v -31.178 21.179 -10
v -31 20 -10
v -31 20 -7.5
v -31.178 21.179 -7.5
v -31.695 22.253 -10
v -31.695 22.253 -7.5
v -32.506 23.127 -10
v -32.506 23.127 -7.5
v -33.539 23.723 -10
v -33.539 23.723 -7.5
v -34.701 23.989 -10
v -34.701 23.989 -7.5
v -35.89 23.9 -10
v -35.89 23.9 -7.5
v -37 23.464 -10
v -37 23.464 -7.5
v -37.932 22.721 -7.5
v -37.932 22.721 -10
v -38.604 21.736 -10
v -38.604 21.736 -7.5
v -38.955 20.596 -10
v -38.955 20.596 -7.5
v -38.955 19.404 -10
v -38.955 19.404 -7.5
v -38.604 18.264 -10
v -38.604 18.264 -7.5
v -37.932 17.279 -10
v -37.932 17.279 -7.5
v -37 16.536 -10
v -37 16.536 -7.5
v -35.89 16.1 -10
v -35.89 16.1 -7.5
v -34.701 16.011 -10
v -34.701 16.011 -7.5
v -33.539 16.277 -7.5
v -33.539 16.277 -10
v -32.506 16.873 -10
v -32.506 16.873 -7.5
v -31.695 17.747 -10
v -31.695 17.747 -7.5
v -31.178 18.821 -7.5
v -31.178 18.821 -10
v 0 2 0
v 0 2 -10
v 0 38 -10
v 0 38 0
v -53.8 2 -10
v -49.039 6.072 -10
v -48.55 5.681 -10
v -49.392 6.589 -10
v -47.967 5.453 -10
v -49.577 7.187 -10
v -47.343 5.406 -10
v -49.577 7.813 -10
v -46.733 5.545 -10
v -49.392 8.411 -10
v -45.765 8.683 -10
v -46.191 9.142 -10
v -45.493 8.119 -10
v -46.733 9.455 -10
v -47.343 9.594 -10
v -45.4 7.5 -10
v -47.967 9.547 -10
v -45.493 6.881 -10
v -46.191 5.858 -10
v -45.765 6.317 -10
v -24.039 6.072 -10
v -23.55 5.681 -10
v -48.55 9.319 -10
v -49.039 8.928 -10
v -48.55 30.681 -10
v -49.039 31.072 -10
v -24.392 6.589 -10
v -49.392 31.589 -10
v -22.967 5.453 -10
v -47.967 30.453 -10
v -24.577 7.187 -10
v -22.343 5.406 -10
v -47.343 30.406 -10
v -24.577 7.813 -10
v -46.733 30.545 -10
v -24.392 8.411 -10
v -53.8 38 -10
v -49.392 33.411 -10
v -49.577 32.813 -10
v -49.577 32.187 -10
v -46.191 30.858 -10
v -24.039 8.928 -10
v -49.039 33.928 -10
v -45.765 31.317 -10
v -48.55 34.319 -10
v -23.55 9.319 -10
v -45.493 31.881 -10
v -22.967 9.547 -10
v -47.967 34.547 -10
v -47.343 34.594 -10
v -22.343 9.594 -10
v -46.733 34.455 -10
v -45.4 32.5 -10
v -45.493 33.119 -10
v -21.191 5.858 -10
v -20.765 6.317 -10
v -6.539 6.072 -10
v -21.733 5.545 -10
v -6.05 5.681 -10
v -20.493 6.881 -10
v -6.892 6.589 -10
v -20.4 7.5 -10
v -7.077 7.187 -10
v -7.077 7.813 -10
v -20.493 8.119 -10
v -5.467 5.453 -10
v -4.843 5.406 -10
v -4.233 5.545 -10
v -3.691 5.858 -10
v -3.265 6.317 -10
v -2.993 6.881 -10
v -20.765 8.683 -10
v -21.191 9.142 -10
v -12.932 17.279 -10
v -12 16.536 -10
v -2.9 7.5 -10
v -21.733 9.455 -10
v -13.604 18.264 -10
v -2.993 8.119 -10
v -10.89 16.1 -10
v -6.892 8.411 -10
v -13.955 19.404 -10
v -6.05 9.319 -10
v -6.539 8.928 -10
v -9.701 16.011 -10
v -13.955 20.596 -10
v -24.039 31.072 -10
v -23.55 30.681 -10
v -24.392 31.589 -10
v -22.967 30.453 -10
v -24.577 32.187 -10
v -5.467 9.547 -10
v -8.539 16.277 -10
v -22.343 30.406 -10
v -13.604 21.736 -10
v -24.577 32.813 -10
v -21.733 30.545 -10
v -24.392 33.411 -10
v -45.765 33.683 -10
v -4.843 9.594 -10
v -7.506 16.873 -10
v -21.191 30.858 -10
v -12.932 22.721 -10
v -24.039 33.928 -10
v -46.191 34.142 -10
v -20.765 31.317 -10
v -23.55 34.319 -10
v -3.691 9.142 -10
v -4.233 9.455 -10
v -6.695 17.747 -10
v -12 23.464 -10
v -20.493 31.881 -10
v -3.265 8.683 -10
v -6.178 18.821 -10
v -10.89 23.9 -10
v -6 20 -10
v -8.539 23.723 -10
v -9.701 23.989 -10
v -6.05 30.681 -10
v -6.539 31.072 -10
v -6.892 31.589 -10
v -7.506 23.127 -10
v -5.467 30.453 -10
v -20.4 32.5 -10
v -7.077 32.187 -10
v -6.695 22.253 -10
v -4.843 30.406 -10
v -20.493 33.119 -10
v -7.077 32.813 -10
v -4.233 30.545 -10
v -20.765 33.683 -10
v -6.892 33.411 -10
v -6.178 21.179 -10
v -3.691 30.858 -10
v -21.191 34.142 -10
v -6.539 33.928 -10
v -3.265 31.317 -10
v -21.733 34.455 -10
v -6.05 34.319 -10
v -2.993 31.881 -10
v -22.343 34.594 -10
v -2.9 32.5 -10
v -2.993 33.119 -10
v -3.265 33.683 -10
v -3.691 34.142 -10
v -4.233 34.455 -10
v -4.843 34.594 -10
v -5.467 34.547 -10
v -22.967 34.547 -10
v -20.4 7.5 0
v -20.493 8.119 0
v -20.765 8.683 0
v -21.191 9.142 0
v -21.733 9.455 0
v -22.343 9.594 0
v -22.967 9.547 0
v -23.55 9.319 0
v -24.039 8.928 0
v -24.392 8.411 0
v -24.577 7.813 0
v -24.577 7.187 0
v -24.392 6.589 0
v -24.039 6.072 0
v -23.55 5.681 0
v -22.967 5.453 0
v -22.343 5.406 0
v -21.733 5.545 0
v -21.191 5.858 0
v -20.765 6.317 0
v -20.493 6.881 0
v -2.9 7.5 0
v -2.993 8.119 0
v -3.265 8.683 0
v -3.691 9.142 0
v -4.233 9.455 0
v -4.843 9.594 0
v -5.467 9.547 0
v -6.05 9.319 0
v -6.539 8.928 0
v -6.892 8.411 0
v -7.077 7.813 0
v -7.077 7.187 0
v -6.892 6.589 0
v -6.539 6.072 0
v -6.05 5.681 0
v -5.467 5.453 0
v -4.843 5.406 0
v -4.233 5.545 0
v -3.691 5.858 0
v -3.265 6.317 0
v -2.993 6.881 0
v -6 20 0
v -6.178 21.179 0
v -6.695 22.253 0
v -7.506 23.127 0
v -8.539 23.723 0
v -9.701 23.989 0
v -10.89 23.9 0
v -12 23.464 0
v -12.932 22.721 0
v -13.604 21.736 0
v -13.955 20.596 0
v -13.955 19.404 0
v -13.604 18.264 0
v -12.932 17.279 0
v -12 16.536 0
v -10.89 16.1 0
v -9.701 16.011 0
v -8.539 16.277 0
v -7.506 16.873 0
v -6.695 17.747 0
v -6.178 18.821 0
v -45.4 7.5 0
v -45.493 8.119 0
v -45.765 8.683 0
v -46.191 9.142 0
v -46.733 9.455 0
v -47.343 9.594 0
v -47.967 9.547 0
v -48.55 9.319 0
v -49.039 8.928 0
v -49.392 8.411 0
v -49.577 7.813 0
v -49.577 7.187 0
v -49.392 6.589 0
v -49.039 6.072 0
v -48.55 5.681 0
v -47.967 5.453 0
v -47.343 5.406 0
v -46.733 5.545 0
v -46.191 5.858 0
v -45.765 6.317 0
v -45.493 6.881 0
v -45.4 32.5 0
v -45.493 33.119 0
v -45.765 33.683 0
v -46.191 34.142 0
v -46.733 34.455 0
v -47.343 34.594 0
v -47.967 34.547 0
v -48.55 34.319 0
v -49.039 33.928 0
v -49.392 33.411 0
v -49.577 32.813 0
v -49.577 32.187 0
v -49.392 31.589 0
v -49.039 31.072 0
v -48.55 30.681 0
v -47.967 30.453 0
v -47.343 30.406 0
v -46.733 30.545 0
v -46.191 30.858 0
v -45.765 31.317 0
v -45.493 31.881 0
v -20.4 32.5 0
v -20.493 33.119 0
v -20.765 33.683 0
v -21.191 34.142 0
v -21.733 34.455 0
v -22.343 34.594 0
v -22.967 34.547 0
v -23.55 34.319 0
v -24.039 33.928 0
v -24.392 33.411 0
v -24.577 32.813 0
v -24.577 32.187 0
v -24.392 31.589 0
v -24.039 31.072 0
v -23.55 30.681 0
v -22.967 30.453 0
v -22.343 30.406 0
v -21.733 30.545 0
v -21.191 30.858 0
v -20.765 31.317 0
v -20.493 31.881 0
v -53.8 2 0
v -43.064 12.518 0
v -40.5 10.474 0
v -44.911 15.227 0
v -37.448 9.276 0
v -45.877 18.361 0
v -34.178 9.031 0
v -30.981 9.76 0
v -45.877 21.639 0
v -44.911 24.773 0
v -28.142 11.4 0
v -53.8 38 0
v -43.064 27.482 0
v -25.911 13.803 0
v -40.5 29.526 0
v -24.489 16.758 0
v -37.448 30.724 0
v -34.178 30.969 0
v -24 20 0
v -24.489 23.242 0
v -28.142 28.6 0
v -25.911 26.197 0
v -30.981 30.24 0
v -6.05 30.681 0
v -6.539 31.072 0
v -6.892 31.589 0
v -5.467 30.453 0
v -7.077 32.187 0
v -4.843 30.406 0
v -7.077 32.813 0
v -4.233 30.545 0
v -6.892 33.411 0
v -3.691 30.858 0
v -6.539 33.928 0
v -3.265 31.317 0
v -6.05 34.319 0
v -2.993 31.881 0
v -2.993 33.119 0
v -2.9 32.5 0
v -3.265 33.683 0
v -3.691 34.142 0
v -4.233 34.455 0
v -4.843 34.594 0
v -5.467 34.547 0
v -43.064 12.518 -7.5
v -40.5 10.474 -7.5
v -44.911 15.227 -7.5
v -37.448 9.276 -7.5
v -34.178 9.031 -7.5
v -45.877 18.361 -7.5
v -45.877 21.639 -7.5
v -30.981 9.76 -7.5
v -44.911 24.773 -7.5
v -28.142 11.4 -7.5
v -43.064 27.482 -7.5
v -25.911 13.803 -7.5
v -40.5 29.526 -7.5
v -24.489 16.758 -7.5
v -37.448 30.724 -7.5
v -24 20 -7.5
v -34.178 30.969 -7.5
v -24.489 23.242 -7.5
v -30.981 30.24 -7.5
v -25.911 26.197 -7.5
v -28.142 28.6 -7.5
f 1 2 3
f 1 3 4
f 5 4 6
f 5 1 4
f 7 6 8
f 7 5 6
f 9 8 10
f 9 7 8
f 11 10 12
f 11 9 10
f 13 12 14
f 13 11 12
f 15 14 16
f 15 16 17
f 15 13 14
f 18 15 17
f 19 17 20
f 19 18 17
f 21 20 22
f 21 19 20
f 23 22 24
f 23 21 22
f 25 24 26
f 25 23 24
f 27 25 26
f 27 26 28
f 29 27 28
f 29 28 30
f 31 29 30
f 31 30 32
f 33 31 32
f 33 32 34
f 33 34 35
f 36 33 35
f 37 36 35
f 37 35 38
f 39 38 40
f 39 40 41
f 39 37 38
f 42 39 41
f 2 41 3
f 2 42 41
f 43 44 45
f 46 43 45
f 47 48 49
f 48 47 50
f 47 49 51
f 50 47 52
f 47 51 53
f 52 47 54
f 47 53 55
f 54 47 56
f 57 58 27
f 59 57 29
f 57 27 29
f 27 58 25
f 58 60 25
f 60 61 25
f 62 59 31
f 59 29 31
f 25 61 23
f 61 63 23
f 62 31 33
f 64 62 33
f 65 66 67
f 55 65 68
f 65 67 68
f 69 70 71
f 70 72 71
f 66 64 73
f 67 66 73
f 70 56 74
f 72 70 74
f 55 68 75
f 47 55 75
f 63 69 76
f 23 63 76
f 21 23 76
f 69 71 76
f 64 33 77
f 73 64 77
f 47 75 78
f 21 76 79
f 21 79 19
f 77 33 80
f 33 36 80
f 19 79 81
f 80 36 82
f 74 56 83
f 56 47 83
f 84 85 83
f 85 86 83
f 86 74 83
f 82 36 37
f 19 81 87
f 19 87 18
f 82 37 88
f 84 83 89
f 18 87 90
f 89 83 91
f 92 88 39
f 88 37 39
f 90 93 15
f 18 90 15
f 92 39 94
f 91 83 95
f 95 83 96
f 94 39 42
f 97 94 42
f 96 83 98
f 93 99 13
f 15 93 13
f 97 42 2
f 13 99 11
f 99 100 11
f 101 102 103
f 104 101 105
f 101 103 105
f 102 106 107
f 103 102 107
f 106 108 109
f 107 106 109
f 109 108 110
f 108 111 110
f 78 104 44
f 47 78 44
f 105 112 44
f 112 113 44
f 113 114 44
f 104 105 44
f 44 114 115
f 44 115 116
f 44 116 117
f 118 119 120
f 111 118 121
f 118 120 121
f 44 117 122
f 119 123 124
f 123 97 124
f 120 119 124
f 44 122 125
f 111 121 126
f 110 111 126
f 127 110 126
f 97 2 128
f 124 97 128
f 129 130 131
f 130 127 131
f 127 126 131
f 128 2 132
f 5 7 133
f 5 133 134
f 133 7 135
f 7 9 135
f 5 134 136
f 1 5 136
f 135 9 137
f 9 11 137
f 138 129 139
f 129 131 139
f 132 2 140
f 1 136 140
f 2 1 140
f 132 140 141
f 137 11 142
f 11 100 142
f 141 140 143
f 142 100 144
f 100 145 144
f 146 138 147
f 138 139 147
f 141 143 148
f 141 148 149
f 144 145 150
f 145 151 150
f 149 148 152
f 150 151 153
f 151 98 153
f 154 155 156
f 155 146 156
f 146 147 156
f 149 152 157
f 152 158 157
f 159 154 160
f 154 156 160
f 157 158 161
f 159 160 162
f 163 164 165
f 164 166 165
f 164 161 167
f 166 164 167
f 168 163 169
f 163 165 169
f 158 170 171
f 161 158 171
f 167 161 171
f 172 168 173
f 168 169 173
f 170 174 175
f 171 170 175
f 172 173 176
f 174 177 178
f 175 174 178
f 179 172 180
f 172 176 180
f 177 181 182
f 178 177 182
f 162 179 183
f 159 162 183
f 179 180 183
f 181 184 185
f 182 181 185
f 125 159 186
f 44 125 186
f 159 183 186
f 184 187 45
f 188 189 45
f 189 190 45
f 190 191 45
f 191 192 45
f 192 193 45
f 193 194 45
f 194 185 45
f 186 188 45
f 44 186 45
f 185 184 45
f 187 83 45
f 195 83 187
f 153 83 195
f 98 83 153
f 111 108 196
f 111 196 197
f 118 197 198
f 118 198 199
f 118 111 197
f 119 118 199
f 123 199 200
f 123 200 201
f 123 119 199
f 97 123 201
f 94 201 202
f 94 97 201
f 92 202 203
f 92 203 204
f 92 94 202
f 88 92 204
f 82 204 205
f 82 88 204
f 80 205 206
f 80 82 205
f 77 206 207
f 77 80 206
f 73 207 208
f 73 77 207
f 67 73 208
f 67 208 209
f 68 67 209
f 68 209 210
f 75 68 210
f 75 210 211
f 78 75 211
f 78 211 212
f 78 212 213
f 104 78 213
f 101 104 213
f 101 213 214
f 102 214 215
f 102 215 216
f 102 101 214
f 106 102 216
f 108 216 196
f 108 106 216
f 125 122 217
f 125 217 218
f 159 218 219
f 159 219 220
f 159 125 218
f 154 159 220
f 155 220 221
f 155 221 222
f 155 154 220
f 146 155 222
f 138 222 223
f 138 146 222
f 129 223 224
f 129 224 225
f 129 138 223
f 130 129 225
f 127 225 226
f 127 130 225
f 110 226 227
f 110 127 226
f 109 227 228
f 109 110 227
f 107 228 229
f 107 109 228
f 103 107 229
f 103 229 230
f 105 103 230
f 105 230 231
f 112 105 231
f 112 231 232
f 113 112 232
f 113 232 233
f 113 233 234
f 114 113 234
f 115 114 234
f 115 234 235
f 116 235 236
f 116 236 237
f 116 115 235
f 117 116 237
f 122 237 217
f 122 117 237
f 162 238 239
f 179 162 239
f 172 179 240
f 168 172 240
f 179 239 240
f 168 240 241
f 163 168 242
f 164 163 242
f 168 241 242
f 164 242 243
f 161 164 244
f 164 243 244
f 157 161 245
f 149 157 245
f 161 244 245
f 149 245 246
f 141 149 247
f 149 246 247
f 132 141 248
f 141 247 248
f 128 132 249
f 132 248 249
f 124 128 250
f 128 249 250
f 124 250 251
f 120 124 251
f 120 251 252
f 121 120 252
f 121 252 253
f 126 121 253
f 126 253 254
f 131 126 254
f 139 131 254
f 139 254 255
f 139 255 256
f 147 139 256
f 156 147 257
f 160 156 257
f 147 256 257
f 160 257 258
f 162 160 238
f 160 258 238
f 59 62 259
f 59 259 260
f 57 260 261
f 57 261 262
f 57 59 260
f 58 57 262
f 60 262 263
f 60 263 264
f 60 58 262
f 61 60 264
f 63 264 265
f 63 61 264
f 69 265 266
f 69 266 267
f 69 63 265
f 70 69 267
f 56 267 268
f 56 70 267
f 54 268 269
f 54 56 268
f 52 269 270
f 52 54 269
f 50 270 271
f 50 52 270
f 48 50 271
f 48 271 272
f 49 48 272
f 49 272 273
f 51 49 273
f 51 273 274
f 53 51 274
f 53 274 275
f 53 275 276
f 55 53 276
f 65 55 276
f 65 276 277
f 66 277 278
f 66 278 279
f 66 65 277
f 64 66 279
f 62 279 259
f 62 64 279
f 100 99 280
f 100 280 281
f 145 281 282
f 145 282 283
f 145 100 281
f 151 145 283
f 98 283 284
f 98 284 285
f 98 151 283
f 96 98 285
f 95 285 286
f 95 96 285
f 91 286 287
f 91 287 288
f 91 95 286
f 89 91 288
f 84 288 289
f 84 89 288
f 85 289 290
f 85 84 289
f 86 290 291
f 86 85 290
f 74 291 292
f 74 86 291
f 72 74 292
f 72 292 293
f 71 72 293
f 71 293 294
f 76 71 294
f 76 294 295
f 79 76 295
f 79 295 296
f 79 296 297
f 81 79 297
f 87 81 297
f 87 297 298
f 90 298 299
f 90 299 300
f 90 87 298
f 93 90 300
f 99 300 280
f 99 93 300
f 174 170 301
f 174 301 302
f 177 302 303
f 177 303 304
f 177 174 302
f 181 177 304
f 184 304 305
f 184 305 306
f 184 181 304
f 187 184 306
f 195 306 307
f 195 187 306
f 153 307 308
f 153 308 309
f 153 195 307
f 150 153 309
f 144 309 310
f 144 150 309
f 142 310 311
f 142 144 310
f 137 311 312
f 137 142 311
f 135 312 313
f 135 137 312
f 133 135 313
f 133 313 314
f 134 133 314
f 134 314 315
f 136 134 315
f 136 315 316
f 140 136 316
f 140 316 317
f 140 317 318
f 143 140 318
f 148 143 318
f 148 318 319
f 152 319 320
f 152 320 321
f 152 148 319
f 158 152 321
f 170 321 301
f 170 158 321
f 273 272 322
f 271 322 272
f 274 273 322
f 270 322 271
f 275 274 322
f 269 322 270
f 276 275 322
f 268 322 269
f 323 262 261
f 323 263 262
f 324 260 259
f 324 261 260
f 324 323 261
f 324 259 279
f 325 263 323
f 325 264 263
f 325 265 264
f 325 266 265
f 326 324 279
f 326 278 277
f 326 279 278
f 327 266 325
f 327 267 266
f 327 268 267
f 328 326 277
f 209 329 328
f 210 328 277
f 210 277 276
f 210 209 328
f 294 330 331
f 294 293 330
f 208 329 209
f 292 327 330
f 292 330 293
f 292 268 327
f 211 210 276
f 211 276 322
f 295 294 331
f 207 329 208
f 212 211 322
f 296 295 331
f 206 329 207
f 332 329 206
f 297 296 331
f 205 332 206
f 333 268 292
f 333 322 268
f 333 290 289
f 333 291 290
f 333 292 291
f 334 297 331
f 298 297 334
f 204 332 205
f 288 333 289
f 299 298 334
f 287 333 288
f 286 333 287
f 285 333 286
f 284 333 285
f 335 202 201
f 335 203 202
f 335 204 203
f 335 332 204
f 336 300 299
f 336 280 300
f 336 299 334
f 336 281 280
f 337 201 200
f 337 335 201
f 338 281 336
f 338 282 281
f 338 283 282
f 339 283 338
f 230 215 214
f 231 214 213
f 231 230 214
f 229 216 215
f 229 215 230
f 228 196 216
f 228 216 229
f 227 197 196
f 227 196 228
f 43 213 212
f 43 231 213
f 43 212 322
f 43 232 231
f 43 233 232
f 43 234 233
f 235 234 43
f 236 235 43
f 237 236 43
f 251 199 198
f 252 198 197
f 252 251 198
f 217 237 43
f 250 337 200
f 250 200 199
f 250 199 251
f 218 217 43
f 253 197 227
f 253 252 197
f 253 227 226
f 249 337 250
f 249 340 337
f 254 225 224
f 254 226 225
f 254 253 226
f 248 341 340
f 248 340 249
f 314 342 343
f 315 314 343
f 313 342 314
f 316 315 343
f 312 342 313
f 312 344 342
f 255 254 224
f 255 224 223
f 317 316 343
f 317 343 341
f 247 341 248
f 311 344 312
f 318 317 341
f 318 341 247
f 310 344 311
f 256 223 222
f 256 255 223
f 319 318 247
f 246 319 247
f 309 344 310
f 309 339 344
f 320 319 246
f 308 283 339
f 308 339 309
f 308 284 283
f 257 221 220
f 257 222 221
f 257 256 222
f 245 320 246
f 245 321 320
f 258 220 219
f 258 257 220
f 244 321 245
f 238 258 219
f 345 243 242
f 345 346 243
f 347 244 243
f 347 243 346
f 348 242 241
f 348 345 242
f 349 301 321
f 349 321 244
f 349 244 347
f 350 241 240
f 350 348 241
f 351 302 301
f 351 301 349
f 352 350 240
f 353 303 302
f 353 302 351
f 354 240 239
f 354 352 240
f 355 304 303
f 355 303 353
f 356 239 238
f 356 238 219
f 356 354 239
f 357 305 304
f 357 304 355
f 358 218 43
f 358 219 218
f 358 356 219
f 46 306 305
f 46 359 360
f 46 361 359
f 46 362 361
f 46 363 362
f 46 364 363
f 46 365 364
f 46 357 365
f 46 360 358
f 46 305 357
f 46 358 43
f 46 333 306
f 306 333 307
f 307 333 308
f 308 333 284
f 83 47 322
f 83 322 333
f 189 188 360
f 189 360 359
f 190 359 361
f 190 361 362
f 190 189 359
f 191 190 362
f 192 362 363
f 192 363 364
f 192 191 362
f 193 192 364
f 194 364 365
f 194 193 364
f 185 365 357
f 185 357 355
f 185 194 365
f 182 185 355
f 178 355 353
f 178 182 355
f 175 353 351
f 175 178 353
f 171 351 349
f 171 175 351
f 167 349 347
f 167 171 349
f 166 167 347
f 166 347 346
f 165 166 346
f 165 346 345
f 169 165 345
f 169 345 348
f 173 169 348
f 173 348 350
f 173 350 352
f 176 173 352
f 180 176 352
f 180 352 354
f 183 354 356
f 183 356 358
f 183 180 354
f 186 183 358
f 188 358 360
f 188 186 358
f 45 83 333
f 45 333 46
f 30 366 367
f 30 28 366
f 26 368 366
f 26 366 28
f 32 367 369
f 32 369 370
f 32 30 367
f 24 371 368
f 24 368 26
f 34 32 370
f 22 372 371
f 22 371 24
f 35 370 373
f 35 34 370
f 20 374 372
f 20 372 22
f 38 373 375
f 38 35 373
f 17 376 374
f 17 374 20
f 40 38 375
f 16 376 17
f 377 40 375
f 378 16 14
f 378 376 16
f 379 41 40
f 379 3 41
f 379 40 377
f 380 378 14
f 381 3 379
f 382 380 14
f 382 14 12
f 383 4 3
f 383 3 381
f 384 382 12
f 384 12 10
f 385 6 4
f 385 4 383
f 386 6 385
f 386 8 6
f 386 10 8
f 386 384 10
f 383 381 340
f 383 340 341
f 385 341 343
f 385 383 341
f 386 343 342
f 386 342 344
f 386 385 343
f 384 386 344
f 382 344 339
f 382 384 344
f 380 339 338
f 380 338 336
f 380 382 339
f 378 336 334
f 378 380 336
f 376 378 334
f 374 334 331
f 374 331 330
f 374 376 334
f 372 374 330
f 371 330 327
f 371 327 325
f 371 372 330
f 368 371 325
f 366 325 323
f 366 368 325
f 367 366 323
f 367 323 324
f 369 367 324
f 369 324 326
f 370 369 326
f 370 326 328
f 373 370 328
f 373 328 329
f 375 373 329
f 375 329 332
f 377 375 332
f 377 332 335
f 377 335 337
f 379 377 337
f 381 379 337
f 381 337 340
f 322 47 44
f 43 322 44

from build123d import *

# Parameters (mm, degrees)
JOTYY_MIRRORED_START         = -10
JOTYY_MIRRORED_OUTLINE_W     = 53.8
JOTYY_MIRRORED_OUTLINE_H     = 36
JOTYY_MIRRORED_OUTLINE_R     = 2.1
JOTYY_MIRRORED_OUTLINE_R_2   = 11
JOTYY_MIRRORED_DEPTH         = 10
JOTYY_MIRRORED_2_OUTLINE_R   = 11
JOTYY_MIRRORED_2_OUTLINE_R_2 = 4
JOTYY_MIRRORED_2_DEPTH       = 2.5
SKETCH1_R                    = 4
CUT_EXTRUDE1_DEPTH           = 10


# Read off the part's stored shape, not the designer's step: jotyy_Mirrored
with BuildPart() as part:
    # jotyy_Mirrored outline → jotyy_Mirrored (new body)
    with BuildSketch(Plane.XY.offset(JOTYY_MIRRORED_START)):
        with Locations((-26.9, 20)):
            Rectangle(JOTYY_MIRRORED_OUTLINE_W, JOTYY_MIRRORED_OUTLINE_H)
        with Locations((-47.5, 7.5)):
            Circle(JOTYY_MIRRORED_OUTLINE_R, mode=Mode.SUBTRACT)
        with Locations((-22.5, 7.5)):
            Circle(JOTYY_MIRRORED_OUTLINE_R, mode=Mode.SUBTRACT)
        with Locations((-5, 7.5)):
            Circle(JOTYY_MIRRORED_OUTLINE_R, mode=Mode.SUBTRACT)
        with Locations((-35, 20)):
            Circle(JOTYY_MIRRORED_OUTLINE_R_2, mode=Mode.SUBTRACT)
        with Locations((-47.5, 32.5)):
            Circle(JOTYY_MIRRORED_OUTLINE_R, mode=Mode.SUBTRACT)
        with Locations((-22.5, 32.5)):
            Circle(JOTYY_MIRRORED_OUTLINE_R, mode=Mode.SUBTRACT)
        with Locations((-5, 32.5)):
            Circle(JOTYY_MIRRORED_OUTLINE_R, mode=Mode.SUBTRACT)
    extrude(amount=JOTYY_MIRRORED_DEPTH)

    # jotyy_Mirrored 2 outline → jotyy_Mirrored 2 (add)
    with BuildSketch(Plane.XY.offset(JOTYY_MIRRORED_START)):
        with Locations((-35, 20)):
            Circle(JOTYY_MIRRORED_2_OUTLINE_R)
        with Locations((-35, 20)):
            Circle(JOTYY_MIRRORED_2_OUTLINE_R_2, mode=Mode.SUBTRACT)
    extrude(amount=JOTYY_MIRRORED_2_DEPTH)

    # Sketch1 → Cut-Extrude1 (cut)
    with BuildSketch(Plane.XY):
        with Locations((-10, 20)):
            Circle(SKETCH1_R)
    extrude(amount=-CUT_EXTRUDE1_DEPTH, mode=Mode.SUBTRACT)


solid = part.part
